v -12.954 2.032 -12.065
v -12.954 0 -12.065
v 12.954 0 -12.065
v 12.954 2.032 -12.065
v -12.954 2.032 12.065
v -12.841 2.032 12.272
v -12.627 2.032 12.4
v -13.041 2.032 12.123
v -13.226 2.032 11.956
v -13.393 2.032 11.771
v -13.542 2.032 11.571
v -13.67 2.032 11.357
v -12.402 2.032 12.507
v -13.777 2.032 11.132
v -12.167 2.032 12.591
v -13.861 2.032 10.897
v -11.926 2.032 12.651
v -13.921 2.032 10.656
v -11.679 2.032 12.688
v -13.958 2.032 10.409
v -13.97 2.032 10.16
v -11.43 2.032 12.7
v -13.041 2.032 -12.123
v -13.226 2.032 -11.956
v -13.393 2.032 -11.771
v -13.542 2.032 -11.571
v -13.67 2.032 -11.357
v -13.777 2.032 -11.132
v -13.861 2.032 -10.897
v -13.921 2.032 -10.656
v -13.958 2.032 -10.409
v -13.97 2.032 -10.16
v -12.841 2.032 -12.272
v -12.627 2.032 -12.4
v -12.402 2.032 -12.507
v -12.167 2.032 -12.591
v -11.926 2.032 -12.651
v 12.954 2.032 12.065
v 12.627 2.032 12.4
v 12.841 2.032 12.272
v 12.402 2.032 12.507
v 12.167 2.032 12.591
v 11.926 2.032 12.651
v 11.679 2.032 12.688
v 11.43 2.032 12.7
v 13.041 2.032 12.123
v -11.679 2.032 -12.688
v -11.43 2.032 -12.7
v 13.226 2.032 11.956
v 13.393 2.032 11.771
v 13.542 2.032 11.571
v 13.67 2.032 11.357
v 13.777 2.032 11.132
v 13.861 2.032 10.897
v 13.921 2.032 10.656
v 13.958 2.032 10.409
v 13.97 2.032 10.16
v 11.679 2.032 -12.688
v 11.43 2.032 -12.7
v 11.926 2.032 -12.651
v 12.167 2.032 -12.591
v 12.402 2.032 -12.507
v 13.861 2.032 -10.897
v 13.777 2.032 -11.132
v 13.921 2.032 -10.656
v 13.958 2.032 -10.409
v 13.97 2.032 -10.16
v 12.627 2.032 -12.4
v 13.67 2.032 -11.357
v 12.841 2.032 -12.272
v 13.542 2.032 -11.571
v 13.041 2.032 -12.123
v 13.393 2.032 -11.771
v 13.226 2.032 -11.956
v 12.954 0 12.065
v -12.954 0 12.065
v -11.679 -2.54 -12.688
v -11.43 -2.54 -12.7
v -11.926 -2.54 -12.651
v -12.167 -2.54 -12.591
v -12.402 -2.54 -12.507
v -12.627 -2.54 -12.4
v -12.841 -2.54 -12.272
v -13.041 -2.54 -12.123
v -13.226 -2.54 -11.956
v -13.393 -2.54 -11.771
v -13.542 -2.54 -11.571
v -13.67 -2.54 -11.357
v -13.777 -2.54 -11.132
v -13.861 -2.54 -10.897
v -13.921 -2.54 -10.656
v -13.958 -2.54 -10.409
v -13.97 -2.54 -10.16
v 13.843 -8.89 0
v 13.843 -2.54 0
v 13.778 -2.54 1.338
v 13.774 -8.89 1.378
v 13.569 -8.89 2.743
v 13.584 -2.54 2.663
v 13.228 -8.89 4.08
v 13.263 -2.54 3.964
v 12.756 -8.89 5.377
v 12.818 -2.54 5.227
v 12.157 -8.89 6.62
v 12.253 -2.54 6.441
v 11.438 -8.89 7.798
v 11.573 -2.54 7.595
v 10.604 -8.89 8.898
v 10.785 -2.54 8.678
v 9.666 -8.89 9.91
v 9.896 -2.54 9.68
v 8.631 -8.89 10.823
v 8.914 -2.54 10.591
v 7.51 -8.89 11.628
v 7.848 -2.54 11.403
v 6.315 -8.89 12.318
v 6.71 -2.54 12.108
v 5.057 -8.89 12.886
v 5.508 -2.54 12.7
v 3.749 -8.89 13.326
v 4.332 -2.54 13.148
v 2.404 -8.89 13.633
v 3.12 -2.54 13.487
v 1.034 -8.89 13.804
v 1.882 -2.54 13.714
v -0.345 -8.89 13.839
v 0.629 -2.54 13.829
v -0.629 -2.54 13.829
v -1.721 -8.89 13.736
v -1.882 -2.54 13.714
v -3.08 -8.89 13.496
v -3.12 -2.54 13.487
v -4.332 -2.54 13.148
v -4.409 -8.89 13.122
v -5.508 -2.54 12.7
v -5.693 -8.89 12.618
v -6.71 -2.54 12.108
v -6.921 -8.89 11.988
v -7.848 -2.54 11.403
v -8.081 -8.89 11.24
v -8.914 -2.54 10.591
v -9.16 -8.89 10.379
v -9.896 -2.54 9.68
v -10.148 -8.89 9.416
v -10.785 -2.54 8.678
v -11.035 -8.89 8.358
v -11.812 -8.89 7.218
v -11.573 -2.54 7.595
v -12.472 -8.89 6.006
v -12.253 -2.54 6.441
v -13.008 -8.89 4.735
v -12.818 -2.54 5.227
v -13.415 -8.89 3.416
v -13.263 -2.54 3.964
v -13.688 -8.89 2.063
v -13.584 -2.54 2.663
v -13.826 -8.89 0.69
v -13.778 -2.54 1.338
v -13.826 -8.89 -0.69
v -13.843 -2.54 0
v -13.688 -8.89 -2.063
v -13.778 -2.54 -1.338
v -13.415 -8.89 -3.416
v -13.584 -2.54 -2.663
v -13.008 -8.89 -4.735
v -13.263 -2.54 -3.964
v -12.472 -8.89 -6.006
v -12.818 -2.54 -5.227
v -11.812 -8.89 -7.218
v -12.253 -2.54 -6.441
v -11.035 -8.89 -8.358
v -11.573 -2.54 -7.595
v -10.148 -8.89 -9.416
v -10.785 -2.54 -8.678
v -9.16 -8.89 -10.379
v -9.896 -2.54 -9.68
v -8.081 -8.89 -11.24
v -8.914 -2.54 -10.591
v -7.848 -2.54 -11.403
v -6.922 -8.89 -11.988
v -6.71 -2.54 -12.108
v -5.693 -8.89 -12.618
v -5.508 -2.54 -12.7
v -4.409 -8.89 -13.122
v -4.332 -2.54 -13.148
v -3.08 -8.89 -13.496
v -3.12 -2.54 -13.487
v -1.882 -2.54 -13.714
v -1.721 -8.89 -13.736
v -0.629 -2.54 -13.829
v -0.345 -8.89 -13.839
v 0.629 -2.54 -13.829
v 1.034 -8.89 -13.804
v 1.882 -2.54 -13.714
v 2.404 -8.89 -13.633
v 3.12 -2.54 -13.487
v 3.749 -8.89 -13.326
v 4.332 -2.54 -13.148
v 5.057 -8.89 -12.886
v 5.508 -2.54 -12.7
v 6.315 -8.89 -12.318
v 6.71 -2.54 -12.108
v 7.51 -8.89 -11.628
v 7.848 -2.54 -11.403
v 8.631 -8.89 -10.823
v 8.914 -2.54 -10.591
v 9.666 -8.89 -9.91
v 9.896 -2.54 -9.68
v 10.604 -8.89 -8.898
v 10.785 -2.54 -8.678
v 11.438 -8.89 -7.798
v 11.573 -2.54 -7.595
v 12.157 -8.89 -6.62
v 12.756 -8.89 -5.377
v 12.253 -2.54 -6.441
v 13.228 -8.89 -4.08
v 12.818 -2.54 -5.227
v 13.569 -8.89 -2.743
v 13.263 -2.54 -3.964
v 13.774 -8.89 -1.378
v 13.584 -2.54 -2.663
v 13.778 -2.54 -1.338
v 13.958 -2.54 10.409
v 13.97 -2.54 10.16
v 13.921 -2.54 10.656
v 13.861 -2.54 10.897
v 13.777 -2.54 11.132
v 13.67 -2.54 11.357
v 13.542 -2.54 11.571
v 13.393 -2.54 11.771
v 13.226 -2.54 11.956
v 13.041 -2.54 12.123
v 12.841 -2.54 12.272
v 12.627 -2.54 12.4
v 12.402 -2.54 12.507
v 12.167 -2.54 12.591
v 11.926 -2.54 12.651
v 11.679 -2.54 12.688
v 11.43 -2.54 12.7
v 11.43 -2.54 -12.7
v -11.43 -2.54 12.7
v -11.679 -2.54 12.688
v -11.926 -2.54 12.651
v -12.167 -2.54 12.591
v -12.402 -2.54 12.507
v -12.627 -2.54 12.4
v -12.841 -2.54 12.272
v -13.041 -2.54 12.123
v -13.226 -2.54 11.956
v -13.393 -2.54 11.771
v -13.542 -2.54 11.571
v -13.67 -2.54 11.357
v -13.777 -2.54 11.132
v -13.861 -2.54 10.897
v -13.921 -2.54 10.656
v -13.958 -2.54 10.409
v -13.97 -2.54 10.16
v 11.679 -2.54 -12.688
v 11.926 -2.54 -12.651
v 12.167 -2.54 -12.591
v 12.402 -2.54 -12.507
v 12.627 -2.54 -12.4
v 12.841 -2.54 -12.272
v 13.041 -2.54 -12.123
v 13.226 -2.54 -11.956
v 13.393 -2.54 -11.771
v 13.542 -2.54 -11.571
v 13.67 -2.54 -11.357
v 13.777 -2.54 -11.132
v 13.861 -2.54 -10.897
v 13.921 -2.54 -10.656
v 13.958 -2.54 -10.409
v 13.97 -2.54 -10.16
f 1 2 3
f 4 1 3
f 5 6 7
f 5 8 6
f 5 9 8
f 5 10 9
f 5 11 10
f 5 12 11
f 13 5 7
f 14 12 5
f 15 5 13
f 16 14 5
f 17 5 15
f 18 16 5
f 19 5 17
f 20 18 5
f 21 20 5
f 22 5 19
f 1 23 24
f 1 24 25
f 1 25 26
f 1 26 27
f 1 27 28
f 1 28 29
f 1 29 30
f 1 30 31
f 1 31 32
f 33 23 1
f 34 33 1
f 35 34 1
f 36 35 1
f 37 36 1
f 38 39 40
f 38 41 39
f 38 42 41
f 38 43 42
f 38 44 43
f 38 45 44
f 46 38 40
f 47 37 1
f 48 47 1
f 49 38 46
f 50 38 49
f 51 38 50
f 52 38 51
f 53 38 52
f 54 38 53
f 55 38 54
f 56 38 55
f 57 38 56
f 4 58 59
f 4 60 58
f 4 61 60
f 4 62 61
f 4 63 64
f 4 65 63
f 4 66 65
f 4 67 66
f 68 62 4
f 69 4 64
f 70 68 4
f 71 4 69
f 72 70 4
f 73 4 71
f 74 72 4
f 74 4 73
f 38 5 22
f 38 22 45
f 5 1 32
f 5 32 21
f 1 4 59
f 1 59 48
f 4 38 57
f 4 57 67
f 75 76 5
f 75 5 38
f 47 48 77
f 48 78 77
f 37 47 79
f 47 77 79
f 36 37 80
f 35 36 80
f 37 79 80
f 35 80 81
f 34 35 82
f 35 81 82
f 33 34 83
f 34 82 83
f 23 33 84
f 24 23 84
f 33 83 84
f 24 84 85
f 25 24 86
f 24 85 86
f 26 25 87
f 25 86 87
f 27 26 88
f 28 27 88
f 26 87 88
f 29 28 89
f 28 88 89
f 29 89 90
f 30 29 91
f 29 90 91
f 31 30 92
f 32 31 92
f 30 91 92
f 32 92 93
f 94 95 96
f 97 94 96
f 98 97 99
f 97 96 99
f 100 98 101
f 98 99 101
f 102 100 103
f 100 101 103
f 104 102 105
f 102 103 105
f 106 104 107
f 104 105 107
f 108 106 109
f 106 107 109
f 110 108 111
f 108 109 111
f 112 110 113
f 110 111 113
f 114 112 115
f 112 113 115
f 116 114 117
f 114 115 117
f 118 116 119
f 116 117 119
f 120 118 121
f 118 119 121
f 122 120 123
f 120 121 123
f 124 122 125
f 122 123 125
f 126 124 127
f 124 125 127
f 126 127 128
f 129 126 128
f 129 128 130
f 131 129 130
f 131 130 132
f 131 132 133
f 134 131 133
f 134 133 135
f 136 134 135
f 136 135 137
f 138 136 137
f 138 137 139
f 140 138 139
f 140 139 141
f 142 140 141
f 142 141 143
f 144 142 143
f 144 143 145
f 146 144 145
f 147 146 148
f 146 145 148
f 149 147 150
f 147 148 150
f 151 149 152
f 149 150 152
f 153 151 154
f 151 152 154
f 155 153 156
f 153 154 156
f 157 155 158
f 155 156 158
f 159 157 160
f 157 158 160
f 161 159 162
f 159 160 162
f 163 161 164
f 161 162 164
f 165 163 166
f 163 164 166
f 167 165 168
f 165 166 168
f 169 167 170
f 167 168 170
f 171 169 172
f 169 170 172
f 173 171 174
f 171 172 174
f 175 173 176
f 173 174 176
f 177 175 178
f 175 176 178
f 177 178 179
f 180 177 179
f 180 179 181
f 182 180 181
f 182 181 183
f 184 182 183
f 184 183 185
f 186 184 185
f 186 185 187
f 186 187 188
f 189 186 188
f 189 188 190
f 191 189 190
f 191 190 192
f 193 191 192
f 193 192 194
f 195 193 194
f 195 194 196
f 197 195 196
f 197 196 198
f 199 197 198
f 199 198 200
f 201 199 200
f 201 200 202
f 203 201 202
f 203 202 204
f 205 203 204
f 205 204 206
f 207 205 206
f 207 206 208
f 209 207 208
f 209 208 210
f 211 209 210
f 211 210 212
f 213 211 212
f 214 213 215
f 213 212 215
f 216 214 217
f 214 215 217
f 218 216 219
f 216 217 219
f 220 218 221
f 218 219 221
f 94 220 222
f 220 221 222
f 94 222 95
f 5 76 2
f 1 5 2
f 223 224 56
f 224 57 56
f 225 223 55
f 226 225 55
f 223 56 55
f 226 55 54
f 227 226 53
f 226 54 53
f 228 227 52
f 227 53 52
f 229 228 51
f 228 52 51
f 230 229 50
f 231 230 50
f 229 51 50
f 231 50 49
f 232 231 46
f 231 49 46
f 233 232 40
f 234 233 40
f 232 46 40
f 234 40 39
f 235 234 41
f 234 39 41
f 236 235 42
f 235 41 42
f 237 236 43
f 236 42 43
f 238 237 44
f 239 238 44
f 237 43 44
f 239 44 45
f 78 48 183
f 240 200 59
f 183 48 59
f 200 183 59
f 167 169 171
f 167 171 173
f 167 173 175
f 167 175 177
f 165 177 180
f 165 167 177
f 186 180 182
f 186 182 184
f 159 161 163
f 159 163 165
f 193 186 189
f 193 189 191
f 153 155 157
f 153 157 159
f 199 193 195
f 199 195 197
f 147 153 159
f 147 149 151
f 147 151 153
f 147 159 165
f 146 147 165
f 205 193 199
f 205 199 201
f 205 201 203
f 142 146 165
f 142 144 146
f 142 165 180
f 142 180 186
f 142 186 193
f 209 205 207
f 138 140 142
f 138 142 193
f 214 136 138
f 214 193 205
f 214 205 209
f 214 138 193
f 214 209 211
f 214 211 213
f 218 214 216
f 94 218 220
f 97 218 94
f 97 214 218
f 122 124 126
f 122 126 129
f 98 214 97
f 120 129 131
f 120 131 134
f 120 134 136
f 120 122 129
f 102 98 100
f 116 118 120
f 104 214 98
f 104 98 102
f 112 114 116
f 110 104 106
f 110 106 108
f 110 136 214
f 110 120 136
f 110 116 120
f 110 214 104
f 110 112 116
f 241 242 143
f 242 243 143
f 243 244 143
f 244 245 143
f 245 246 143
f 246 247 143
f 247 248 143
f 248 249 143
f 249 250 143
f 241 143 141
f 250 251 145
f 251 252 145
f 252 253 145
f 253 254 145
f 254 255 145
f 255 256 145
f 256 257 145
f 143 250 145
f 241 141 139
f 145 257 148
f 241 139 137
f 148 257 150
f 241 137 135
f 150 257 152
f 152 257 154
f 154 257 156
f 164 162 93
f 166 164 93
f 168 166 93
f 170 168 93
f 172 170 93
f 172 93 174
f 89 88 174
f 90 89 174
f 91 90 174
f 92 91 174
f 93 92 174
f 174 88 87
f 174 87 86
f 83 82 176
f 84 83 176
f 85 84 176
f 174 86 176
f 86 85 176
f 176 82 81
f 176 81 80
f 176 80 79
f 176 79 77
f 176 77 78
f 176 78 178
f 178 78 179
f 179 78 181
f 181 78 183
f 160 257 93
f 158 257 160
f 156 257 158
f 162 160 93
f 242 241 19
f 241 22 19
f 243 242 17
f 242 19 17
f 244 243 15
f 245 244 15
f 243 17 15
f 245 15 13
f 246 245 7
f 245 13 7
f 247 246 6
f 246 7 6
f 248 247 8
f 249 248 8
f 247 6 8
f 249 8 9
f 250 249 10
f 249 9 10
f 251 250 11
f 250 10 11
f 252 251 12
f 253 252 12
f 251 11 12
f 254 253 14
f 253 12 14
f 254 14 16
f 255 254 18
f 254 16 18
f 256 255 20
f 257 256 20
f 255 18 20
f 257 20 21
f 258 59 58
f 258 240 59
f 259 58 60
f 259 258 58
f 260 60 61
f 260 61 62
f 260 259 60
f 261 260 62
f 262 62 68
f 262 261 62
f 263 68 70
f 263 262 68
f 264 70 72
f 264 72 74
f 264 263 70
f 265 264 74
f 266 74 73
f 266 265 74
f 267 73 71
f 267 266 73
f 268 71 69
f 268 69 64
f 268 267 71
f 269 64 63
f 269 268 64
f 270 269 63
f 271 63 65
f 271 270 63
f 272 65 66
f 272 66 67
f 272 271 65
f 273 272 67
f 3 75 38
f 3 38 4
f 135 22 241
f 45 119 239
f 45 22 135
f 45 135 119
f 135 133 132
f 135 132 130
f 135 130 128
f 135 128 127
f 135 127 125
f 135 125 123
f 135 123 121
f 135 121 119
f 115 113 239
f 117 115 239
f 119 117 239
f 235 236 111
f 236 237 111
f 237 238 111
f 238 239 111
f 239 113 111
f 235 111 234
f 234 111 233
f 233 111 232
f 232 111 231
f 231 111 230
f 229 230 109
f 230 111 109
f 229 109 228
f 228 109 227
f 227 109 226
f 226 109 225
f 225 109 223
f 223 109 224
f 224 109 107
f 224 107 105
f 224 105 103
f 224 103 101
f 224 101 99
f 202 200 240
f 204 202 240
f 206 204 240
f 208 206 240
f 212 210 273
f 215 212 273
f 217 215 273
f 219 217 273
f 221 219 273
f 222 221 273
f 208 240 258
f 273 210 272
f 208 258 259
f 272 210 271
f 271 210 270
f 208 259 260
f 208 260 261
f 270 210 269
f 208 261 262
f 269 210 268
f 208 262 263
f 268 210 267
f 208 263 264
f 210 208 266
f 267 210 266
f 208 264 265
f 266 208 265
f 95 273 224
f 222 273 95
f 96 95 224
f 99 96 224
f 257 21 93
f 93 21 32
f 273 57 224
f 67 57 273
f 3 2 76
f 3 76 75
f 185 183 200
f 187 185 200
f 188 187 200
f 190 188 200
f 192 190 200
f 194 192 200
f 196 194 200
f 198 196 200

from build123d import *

# Parameters (mm, degrees)
SKETCH1_W           = 27.94
SKETCH1_H           = 25.4
SKETCH1_W_2         = 25.908
SKETCH1_H_2         = 24.13
BOSS_EXTRUDE1_DEPTH = 2.032
SKETCH2_W           = 27.94
SKETCH2_H           = 25.4
BOSS_EXTRUDE2_DEPTH = 2.54
SKETCH3_R           = 13.843
BOSS_EXTRUDE3_DEPTH = 6.35
FILLET1_R           = 2.54


with BuildPart() as part:
    # Sketch1 → Boss-Extrude1 (new body)
    with BuildSketch(Plane(origin=(0, 0, 0), x_dir=(1, 0, 0), z_dir=(0, 1, 0))):
        Rectangle(SKETCH1_W, SKETCH1_H)
        Rectangle(SKETCH1_W_2, SKETCH1_H_2, mode=Mode.SUBTRACT)
    extrude(amount=BOSS_EXTRUDE1_DEPTH)

    # Sketch2 → Boss-Extrude2 (add)
    with BuildSketch(Plane(origin=(0, 0, 0), x_dir=(1, 0, 0), z_dir=(0, 1, 0))):
        Rectangle(SKETCH2_W, SKETCH2_H)
    extrude(amount=-BOSS_EXTRUDE2_DEPTH)

    # Sketch3 → Boss-Extrude3 (add)
    with BuildSketch(Plane.XZ.offset(2.54)):
        Circle(SKETCH3_R)
    extrude(amount=BOSS_EXTRUDE3_DEPTH)

    # Fillet1
    fillet1_edges = [part.edges().sort_by_distance(p)[0] for p in [
        (13.97, -0.254, 12.7),
        (-13.97, -0.254, 12.7),
        (-13.97, -0.254, -12.7),
        (13.97, -0.254, -12.7),
    ]]
    fillet(fillet1_edges, radius=FILLET1_R)


solid = part.part
